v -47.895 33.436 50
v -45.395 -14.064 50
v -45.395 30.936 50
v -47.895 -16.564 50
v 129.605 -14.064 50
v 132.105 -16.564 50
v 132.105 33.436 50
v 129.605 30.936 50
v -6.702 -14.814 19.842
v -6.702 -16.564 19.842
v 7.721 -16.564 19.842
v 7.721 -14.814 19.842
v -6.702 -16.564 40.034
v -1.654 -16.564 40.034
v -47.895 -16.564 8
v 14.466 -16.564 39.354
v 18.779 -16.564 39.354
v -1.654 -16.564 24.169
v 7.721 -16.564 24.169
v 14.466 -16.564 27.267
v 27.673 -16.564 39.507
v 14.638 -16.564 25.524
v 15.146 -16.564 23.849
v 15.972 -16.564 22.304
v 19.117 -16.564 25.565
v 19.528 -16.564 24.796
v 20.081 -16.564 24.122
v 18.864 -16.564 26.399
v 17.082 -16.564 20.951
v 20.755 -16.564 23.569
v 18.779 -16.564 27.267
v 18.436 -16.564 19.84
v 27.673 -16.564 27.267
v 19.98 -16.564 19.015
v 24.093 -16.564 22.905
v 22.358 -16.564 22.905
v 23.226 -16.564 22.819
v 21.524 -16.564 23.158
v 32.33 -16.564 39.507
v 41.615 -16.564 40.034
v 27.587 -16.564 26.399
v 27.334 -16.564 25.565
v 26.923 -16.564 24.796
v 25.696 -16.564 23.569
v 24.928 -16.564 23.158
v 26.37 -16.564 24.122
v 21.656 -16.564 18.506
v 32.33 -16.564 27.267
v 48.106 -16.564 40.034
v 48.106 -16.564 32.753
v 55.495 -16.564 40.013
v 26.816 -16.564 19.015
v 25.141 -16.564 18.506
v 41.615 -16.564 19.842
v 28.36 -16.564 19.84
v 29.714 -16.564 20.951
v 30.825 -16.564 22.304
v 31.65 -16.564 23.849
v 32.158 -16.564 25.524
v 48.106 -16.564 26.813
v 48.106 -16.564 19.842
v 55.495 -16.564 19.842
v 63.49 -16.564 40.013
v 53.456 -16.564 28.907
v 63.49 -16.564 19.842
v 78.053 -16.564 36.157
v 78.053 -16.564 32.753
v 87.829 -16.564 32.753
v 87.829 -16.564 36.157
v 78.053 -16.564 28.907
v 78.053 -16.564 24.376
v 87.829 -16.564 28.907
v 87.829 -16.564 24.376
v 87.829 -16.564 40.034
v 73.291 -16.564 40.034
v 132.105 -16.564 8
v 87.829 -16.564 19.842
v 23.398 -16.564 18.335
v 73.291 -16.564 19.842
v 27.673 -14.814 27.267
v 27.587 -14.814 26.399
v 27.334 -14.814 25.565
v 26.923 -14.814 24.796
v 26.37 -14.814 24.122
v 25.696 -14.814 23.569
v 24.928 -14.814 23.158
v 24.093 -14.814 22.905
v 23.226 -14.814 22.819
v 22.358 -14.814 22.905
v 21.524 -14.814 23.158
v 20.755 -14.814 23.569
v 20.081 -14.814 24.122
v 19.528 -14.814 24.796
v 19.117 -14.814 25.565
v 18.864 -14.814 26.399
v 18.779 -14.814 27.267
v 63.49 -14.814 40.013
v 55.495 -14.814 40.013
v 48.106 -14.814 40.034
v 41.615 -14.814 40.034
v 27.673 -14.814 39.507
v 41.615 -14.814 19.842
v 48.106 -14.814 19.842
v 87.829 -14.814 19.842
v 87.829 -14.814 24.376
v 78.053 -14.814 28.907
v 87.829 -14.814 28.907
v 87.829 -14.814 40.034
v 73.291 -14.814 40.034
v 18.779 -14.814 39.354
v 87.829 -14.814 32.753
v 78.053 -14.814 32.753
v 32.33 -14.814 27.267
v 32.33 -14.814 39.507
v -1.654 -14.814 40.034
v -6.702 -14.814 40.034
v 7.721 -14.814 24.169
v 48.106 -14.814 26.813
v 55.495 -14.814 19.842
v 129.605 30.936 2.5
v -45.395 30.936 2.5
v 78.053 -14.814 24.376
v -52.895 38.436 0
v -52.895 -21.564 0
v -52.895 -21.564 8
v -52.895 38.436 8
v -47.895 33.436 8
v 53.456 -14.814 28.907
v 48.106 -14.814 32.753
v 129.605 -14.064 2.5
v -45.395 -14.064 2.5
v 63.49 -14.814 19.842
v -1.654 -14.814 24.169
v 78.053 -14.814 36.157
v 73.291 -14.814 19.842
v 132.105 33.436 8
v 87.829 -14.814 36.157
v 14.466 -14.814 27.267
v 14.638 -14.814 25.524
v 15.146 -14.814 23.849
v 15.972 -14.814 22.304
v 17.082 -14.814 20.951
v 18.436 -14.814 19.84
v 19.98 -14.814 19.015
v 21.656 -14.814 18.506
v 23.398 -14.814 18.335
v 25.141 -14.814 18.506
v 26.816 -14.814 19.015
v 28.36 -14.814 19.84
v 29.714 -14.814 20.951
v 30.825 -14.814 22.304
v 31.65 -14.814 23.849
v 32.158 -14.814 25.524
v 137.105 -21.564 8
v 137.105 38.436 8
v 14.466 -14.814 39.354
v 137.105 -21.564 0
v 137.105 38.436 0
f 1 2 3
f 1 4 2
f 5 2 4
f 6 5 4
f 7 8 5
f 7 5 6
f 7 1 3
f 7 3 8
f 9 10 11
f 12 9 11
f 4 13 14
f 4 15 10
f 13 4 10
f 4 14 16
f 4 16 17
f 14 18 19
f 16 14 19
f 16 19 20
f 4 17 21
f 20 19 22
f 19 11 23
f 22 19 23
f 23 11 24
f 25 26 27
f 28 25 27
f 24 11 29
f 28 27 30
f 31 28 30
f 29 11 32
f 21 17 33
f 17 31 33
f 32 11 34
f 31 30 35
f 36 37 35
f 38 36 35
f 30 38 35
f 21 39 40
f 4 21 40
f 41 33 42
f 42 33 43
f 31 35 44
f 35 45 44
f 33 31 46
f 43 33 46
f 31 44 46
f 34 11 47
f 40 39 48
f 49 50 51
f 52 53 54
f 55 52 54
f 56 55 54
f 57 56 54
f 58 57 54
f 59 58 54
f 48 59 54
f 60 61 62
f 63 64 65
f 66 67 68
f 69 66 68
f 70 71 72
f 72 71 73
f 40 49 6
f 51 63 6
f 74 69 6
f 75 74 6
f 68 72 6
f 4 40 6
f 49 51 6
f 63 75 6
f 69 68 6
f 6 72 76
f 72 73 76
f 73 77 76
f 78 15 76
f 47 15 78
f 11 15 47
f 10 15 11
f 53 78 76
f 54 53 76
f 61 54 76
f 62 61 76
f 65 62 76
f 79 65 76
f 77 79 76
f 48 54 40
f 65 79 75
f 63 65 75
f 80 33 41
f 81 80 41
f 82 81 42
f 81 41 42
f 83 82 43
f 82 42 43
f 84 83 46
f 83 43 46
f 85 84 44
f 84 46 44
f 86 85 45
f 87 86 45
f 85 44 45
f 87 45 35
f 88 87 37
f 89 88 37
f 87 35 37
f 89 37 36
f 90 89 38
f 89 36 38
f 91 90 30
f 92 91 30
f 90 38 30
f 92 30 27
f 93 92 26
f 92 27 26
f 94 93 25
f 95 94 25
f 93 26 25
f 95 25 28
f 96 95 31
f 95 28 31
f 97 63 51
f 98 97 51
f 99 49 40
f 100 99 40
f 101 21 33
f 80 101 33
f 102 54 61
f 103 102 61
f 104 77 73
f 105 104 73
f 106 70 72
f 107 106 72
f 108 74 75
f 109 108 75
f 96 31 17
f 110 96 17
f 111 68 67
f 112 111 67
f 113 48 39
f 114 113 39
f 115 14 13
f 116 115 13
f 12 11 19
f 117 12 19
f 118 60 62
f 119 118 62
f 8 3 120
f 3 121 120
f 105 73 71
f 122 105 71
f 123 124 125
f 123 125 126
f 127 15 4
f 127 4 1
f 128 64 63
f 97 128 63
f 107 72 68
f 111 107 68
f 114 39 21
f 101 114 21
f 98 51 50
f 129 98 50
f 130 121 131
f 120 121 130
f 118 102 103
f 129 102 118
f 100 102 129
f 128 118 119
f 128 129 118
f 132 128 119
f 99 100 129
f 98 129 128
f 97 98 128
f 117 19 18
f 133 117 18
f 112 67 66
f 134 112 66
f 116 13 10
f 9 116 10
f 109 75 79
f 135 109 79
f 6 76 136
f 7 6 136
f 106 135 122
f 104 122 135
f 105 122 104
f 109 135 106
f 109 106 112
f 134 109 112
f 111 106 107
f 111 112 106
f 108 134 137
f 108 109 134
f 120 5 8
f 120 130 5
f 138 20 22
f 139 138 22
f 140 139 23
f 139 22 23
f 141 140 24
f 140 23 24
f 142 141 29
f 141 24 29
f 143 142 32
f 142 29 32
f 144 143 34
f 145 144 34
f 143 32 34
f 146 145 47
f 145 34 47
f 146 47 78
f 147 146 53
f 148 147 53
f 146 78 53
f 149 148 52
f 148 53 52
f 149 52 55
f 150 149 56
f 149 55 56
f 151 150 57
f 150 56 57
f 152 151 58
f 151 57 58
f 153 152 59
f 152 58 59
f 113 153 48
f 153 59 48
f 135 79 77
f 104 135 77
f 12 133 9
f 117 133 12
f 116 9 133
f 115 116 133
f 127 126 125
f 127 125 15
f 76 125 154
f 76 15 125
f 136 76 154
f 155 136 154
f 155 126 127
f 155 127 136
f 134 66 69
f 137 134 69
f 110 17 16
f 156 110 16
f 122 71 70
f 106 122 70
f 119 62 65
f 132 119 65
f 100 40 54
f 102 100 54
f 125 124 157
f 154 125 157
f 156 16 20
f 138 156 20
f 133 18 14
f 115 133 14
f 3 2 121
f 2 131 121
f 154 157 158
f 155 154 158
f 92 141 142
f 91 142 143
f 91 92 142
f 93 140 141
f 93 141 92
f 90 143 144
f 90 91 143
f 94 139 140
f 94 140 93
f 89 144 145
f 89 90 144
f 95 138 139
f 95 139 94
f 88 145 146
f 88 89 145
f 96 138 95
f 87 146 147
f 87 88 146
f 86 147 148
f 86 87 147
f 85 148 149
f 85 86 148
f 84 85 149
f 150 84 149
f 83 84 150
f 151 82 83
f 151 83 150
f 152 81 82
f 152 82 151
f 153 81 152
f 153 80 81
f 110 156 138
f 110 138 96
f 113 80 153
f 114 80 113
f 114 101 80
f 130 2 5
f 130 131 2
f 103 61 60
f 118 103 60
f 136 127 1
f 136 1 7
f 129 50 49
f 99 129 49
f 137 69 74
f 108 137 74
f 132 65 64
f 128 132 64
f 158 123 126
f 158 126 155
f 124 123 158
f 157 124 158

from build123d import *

# Parameters (mm, degrees)
F0_W     = 180
F0_H     = 50
F1_DEPTH = 50
F2_T     = -2.5
F0_W_2   = 190
F0_H_2   = 60
F3_DEPTH = 8
F5_DEPTH = 1.75


with BuildPart() as f1:
    # F0 (on Top) → F1 (new body)
    with BuildSketch(Plane.XY):
        with Locations((42.104505, 8.436477)):
            Rectangle(F0_W, F0_H)
    extrude(amount=F1_DEPTH)

    # F2
    f2_openings = [f1.faces().sort_by_distance(p)[0] for p in [
        (42.104505, 8.436477, 50),
    ]]
    offset(amount=F2_T, openings=f2_openings)

    # F0 (on Top) → F3 (join)
    with BuildSketch(Plane.XY):
        with Locations((42.104505, 8.436477)):
            Rectangle(F0_W_2, F0_H_2)
        with Locations((42.104505, 8.436477)):
            Rectangle(F0_W, F0_H, mode=Mode.SUBTRACT)
    extrude(amount=F3_DEPTH)

    # F4 (on face) → F5 (cut)
    with BuildSketch(Plane.XZ.offset(16.563523)):
        with BuildLine():
            Line((18.778705, 27.266525), (18.778705, 39.354309))
            Line((18.778705, 39.354309), (14.466432, 39.354309))
            Line((14.466432, 39.354309), (14.466432, 27.266525))
            ThreePointArc((14.466432, 27.266525), (23.398135, 18.334822), (32.329838, 27.266525))
            Line((32.329838, 27.266525), (32.329838, 39.507348))
            Line((32.329838, 39.507348), (27.672919, 39.507348))
            Line((27.672919, 39.507348), (27.672919, 27.266525))
            ThreePointArc((27.672919, 27.266525), (23.225812, 22.819418), (18.778705, 27.266525))
        make_face()
        Polygon((-1.653947, 40.034065), (-6.702017, 40.034065), (-6.702017, 19.841794), (7.721034, 19.841794), (7.721034, 24.168709), (-1.653947, 24.168709), align=None)
        Polygon((48.105575, 40.034065), (41.615201, 40.034065), (41.615201, 19.841794), (48.105575, 19.841794), (48.105575, 26.812933), (55.495456, 19.841794), (63.49016, 19.841794), (53.456086, 28.907086), (63.49016, 40.013472), (55.495456, 40.013472), (48.105575, 32.753399), align=None)
        Polygon((87.829128, 40.034065), (73.290575, 40.034065), (73.290575, 19.841794), (87.829128, 19.841794), (87.829128, 24.375837), (78.053206, 24.375837), (78.053206, 28.907086), (87.829128, 28.907086), (87.829128, 32.753399), (78.053206, 32.753399), (78.053206, 36.157073), (87.829128, 36.157073), align=None)
    extrude(amount=-F5_DEPTH, mode=Mode.SUBTRACT)


solid = f1.part
